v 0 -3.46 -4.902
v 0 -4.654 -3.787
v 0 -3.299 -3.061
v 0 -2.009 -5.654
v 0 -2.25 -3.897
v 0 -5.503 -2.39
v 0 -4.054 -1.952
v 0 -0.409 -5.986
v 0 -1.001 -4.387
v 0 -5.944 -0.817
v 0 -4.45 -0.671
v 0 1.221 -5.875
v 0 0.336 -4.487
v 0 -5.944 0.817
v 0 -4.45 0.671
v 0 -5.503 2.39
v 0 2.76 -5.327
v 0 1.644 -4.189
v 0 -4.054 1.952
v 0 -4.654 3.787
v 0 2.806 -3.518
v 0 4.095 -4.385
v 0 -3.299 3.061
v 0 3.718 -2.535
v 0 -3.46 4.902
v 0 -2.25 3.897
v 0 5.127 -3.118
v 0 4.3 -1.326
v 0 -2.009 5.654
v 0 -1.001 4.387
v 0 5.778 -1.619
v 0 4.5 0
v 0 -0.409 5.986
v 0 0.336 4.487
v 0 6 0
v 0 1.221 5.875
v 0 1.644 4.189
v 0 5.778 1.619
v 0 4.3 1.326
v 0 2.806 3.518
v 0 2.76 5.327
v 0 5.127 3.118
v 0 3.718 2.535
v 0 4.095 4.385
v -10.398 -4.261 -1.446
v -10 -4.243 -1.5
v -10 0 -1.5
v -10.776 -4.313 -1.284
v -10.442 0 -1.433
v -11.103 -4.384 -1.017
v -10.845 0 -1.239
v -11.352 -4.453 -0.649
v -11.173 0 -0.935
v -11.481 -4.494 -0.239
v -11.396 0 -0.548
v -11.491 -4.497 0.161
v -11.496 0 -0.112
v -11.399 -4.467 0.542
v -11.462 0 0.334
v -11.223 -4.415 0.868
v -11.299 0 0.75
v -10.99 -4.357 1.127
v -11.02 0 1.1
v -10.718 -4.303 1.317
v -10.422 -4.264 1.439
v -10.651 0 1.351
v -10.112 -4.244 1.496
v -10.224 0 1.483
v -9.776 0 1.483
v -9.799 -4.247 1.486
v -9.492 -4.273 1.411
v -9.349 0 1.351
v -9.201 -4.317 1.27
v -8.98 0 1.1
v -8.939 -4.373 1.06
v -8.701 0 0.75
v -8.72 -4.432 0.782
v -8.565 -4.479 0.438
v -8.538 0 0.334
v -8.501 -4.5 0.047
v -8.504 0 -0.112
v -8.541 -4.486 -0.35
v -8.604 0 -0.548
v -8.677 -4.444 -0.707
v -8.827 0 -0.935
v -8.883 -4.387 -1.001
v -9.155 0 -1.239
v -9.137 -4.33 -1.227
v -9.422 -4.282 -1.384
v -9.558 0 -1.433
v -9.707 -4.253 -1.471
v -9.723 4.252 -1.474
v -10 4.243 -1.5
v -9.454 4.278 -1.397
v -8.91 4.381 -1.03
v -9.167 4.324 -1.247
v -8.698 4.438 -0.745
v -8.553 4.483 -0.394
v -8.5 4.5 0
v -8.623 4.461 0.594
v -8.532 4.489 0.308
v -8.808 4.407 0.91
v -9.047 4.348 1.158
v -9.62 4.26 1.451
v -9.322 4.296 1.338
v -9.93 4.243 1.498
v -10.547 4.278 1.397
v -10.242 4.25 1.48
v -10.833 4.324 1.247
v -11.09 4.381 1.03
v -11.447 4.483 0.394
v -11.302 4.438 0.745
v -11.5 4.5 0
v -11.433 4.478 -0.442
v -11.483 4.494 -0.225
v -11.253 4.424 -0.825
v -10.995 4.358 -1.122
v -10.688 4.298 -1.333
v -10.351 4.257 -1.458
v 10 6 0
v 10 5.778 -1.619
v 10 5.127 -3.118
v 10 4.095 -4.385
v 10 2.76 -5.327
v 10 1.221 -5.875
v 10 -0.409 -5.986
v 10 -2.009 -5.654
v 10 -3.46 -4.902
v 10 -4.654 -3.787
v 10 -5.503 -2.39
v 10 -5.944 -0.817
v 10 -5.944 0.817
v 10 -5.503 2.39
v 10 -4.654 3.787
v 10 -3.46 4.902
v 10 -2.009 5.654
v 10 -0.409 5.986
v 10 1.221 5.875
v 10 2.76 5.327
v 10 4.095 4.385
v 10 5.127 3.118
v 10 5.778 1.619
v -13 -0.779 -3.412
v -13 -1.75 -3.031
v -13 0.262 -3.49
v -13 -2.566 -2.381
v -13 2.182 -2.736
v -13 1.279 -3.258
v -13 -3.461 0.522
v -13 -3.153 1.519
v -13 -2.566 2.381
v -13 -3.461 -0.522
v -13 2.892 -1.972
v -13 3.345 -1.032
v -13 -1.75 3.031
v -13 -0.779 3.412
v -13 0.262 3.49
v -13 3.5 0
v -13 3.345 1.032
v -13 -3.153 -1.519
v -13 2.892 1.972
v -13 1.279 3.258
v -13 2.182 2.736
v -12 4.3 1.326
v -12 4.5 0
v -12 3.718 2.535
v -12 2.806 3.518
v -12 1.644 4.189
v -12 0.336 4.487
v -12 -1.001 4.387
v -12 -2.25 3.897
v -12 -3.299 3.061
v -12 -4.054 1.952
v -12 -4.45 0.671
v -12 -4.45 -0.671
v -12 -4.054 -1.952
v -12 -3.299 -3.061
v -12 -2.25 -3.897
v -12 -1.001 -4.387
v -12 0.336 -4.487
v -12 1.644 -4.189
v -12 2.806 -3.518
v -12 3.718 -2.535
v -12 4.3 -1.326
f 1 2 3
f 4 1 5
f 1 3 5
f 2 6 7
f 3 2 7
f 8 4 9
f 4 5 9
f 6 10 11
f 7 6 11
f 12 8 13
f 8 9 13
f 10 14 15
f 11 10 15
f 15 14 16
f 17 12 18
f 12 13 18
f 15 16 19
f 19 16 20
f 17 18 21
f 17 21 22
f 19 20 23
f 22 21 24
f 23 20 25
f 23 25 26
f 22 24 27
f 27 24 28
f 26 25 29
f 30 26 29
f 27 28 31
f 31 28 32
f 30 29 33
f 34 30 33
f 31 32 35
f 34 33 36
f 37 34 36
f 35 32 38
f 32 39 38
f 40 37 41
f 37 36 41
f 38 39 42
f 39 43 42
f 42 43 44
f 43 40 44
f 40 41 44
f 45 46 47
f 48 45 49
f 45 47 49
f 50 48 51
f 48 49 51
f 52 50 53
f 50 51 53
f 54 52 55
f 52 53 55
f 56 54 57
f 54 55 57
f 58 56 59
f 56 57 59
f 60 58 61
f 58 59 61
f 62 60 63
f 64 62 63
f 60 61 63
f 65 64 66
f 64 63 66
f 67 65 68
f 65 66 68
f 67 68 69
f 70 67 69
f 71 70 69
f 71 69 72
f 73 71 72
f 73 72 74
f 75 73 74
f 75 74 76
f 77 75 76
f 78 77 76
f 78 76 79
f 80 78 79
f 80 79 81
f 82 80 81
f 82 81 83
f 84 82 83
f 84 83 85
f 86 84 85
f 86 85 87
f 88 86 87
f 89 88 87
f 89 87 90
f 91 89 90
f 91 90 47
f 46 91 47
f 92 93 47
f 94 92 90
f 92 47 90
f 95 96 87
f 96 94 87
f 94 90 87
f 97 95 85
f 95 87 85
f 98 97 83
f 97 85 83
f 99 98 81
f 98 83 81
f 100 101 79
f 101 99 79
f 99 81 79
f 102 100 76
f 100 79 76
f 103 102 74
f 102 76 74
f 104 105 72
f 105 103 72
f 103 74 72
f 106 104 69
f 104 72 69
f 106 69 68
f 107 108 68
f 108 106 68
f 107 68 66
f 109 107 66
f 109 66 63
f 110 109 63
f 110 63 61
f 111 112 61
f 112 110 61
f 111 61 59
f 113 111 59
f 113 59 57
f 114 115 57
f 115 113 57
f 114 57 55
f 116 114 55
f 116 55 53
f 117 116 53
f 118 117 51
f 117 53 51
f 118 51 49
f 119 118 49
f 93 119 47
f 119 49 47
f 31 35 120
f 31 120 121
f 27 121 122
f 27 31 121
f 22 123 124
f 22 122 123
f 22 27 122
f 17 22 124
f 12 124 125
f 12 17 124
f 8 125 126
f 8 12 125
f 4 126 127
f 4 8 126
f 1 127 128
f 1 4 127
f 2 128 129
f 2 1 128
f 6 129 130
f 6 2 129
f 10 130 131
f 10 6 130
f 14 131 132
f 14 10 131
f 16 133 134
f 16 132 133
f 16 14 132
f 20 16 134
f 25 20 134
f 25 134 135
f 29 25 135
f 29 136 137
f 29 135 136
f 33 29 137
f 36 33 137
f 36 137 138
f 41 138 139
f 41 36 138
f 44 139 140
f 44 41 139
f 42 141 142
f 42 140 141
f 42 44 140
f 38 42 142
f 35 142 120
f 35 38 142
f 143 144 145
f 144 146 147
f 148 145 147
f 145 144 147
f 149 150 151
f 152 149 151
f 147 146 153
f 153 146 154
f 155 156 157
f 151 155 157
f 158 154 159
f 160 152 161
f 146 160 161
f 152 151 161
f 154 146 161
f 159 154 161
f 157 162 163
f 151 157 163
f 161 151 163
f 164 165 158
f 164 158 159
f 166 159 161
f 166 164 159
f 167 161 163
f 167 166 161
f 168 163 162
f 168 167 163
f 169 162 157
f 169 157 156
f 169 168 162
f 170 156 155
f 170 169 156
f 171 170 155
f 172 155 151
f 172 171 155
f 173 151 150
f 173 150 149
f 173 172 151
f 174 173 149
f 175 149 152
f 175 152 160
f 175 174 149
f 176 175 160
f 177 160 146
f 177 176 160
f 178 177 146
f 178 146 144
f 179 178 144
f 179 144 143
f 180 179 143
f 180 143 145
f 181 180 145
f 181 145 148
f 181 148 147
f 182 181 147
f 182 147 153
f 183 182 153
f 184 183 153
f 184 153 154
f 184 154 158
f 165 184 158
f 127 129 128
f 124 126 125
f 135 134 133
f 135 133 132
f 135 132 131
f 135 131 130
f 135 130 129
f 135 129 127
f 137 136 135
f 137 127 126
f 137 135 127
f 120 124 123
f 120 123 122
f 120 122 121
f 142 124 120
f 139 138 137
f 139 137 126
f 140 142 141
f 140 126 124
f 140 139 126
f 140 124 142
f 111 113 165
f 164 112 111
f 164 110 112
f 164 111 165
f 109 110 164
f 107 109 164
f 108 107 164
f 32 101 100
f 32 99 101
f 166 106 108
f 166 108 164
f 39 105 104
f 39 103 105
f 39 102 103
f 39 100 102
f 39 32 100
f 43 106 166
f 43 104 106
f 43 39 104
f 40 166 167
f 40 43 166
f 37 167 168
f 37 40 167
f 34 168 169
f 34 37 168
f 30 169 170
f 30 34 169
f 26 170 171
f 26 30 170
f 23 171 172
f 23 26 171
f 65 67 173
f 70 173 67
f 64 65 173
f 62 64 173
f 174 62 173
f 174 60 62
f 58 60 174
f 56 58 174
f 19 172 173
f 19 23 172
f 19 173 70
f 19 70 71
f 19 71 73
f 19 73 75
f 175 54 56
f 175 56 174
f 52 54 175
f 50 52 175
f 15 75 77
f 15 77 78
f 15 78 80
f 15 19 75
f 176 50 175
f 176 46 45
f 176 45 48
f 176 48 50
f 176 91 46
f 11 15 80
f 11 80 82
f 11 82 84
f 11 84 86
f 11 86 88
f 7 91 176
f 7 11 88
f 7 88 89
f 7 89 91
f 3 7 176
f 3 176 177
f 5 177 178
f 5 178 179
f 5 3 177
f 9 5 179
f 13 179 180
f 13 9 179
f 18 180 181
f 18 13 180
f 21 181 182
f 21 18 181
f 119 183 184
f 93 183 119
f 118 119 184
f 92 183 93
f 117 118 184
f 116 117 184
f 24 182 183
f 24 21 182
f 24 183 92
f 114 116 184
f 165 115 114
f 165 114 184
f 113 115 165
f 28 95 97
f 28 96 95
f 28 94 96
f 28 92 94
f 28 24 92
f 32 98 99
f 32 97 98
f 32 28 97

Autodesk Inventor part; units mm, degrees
ref_plane "YZ Plane" through (0, 0, 0) normal (1, 0, 0) x (0, 1, 0)
ref_plane "XZ Plane" through (0, 0, 0) normal (0, 1, 0) x (-1, 0, 0)
ref_plane "XY Plane" through (0, 0, 0) normal (0, 0, 1) x (1, 0, 0)
sketch "Sketch1" plane through (0, 0, 0) normal (1, 0, 0) x (0, 1, 0)
  circle A0 centre (0, 0) radius 6
  circle A1 centre (0, 0) radius 4.5
  dimension "d0" = 12
  dimension "d1" = 9
extrude "Extrusion1" add sketch "Sketch1" along normal blind 10 contours A0 | A1
extrude "Extrusion2" add sketch "Sketch1" against normal blind 13 contours A1
chamfer "Chamfer1" distance 1 angle 45 1 edges at (-13, -4.5, 0)
thread "Thread1" size "M9x1.25" class "6g" standard "ANSI Metric M Profile" full length
sketch "Sketch2" plane through (-13, 0, 0) normal (-1, 0, 0) x (0, 0, 1)
  line L0 (0, 0) -> (-8.2207, 0)
ref_plane "Work Plane1" through (-13, 0, 0) normal (0, 1, 0) x (0, 0, -1)
sketch "Sketch3" plane through (-13, 0, 0) normal (0, 1, 0) x (0, 0, -1)
  circle A0 centre (0, -3) radius 1.5
  line L0 (6, -13) -> (-6, -13) projected
  point P0 (0, -13)
  dimension "d12" = 3
  dimension "d13" = 10
extrude "Extrusion3" cut sketch "Sketch3" along normal blind 10 and the other way blind 5
properties part number "Tengely"
